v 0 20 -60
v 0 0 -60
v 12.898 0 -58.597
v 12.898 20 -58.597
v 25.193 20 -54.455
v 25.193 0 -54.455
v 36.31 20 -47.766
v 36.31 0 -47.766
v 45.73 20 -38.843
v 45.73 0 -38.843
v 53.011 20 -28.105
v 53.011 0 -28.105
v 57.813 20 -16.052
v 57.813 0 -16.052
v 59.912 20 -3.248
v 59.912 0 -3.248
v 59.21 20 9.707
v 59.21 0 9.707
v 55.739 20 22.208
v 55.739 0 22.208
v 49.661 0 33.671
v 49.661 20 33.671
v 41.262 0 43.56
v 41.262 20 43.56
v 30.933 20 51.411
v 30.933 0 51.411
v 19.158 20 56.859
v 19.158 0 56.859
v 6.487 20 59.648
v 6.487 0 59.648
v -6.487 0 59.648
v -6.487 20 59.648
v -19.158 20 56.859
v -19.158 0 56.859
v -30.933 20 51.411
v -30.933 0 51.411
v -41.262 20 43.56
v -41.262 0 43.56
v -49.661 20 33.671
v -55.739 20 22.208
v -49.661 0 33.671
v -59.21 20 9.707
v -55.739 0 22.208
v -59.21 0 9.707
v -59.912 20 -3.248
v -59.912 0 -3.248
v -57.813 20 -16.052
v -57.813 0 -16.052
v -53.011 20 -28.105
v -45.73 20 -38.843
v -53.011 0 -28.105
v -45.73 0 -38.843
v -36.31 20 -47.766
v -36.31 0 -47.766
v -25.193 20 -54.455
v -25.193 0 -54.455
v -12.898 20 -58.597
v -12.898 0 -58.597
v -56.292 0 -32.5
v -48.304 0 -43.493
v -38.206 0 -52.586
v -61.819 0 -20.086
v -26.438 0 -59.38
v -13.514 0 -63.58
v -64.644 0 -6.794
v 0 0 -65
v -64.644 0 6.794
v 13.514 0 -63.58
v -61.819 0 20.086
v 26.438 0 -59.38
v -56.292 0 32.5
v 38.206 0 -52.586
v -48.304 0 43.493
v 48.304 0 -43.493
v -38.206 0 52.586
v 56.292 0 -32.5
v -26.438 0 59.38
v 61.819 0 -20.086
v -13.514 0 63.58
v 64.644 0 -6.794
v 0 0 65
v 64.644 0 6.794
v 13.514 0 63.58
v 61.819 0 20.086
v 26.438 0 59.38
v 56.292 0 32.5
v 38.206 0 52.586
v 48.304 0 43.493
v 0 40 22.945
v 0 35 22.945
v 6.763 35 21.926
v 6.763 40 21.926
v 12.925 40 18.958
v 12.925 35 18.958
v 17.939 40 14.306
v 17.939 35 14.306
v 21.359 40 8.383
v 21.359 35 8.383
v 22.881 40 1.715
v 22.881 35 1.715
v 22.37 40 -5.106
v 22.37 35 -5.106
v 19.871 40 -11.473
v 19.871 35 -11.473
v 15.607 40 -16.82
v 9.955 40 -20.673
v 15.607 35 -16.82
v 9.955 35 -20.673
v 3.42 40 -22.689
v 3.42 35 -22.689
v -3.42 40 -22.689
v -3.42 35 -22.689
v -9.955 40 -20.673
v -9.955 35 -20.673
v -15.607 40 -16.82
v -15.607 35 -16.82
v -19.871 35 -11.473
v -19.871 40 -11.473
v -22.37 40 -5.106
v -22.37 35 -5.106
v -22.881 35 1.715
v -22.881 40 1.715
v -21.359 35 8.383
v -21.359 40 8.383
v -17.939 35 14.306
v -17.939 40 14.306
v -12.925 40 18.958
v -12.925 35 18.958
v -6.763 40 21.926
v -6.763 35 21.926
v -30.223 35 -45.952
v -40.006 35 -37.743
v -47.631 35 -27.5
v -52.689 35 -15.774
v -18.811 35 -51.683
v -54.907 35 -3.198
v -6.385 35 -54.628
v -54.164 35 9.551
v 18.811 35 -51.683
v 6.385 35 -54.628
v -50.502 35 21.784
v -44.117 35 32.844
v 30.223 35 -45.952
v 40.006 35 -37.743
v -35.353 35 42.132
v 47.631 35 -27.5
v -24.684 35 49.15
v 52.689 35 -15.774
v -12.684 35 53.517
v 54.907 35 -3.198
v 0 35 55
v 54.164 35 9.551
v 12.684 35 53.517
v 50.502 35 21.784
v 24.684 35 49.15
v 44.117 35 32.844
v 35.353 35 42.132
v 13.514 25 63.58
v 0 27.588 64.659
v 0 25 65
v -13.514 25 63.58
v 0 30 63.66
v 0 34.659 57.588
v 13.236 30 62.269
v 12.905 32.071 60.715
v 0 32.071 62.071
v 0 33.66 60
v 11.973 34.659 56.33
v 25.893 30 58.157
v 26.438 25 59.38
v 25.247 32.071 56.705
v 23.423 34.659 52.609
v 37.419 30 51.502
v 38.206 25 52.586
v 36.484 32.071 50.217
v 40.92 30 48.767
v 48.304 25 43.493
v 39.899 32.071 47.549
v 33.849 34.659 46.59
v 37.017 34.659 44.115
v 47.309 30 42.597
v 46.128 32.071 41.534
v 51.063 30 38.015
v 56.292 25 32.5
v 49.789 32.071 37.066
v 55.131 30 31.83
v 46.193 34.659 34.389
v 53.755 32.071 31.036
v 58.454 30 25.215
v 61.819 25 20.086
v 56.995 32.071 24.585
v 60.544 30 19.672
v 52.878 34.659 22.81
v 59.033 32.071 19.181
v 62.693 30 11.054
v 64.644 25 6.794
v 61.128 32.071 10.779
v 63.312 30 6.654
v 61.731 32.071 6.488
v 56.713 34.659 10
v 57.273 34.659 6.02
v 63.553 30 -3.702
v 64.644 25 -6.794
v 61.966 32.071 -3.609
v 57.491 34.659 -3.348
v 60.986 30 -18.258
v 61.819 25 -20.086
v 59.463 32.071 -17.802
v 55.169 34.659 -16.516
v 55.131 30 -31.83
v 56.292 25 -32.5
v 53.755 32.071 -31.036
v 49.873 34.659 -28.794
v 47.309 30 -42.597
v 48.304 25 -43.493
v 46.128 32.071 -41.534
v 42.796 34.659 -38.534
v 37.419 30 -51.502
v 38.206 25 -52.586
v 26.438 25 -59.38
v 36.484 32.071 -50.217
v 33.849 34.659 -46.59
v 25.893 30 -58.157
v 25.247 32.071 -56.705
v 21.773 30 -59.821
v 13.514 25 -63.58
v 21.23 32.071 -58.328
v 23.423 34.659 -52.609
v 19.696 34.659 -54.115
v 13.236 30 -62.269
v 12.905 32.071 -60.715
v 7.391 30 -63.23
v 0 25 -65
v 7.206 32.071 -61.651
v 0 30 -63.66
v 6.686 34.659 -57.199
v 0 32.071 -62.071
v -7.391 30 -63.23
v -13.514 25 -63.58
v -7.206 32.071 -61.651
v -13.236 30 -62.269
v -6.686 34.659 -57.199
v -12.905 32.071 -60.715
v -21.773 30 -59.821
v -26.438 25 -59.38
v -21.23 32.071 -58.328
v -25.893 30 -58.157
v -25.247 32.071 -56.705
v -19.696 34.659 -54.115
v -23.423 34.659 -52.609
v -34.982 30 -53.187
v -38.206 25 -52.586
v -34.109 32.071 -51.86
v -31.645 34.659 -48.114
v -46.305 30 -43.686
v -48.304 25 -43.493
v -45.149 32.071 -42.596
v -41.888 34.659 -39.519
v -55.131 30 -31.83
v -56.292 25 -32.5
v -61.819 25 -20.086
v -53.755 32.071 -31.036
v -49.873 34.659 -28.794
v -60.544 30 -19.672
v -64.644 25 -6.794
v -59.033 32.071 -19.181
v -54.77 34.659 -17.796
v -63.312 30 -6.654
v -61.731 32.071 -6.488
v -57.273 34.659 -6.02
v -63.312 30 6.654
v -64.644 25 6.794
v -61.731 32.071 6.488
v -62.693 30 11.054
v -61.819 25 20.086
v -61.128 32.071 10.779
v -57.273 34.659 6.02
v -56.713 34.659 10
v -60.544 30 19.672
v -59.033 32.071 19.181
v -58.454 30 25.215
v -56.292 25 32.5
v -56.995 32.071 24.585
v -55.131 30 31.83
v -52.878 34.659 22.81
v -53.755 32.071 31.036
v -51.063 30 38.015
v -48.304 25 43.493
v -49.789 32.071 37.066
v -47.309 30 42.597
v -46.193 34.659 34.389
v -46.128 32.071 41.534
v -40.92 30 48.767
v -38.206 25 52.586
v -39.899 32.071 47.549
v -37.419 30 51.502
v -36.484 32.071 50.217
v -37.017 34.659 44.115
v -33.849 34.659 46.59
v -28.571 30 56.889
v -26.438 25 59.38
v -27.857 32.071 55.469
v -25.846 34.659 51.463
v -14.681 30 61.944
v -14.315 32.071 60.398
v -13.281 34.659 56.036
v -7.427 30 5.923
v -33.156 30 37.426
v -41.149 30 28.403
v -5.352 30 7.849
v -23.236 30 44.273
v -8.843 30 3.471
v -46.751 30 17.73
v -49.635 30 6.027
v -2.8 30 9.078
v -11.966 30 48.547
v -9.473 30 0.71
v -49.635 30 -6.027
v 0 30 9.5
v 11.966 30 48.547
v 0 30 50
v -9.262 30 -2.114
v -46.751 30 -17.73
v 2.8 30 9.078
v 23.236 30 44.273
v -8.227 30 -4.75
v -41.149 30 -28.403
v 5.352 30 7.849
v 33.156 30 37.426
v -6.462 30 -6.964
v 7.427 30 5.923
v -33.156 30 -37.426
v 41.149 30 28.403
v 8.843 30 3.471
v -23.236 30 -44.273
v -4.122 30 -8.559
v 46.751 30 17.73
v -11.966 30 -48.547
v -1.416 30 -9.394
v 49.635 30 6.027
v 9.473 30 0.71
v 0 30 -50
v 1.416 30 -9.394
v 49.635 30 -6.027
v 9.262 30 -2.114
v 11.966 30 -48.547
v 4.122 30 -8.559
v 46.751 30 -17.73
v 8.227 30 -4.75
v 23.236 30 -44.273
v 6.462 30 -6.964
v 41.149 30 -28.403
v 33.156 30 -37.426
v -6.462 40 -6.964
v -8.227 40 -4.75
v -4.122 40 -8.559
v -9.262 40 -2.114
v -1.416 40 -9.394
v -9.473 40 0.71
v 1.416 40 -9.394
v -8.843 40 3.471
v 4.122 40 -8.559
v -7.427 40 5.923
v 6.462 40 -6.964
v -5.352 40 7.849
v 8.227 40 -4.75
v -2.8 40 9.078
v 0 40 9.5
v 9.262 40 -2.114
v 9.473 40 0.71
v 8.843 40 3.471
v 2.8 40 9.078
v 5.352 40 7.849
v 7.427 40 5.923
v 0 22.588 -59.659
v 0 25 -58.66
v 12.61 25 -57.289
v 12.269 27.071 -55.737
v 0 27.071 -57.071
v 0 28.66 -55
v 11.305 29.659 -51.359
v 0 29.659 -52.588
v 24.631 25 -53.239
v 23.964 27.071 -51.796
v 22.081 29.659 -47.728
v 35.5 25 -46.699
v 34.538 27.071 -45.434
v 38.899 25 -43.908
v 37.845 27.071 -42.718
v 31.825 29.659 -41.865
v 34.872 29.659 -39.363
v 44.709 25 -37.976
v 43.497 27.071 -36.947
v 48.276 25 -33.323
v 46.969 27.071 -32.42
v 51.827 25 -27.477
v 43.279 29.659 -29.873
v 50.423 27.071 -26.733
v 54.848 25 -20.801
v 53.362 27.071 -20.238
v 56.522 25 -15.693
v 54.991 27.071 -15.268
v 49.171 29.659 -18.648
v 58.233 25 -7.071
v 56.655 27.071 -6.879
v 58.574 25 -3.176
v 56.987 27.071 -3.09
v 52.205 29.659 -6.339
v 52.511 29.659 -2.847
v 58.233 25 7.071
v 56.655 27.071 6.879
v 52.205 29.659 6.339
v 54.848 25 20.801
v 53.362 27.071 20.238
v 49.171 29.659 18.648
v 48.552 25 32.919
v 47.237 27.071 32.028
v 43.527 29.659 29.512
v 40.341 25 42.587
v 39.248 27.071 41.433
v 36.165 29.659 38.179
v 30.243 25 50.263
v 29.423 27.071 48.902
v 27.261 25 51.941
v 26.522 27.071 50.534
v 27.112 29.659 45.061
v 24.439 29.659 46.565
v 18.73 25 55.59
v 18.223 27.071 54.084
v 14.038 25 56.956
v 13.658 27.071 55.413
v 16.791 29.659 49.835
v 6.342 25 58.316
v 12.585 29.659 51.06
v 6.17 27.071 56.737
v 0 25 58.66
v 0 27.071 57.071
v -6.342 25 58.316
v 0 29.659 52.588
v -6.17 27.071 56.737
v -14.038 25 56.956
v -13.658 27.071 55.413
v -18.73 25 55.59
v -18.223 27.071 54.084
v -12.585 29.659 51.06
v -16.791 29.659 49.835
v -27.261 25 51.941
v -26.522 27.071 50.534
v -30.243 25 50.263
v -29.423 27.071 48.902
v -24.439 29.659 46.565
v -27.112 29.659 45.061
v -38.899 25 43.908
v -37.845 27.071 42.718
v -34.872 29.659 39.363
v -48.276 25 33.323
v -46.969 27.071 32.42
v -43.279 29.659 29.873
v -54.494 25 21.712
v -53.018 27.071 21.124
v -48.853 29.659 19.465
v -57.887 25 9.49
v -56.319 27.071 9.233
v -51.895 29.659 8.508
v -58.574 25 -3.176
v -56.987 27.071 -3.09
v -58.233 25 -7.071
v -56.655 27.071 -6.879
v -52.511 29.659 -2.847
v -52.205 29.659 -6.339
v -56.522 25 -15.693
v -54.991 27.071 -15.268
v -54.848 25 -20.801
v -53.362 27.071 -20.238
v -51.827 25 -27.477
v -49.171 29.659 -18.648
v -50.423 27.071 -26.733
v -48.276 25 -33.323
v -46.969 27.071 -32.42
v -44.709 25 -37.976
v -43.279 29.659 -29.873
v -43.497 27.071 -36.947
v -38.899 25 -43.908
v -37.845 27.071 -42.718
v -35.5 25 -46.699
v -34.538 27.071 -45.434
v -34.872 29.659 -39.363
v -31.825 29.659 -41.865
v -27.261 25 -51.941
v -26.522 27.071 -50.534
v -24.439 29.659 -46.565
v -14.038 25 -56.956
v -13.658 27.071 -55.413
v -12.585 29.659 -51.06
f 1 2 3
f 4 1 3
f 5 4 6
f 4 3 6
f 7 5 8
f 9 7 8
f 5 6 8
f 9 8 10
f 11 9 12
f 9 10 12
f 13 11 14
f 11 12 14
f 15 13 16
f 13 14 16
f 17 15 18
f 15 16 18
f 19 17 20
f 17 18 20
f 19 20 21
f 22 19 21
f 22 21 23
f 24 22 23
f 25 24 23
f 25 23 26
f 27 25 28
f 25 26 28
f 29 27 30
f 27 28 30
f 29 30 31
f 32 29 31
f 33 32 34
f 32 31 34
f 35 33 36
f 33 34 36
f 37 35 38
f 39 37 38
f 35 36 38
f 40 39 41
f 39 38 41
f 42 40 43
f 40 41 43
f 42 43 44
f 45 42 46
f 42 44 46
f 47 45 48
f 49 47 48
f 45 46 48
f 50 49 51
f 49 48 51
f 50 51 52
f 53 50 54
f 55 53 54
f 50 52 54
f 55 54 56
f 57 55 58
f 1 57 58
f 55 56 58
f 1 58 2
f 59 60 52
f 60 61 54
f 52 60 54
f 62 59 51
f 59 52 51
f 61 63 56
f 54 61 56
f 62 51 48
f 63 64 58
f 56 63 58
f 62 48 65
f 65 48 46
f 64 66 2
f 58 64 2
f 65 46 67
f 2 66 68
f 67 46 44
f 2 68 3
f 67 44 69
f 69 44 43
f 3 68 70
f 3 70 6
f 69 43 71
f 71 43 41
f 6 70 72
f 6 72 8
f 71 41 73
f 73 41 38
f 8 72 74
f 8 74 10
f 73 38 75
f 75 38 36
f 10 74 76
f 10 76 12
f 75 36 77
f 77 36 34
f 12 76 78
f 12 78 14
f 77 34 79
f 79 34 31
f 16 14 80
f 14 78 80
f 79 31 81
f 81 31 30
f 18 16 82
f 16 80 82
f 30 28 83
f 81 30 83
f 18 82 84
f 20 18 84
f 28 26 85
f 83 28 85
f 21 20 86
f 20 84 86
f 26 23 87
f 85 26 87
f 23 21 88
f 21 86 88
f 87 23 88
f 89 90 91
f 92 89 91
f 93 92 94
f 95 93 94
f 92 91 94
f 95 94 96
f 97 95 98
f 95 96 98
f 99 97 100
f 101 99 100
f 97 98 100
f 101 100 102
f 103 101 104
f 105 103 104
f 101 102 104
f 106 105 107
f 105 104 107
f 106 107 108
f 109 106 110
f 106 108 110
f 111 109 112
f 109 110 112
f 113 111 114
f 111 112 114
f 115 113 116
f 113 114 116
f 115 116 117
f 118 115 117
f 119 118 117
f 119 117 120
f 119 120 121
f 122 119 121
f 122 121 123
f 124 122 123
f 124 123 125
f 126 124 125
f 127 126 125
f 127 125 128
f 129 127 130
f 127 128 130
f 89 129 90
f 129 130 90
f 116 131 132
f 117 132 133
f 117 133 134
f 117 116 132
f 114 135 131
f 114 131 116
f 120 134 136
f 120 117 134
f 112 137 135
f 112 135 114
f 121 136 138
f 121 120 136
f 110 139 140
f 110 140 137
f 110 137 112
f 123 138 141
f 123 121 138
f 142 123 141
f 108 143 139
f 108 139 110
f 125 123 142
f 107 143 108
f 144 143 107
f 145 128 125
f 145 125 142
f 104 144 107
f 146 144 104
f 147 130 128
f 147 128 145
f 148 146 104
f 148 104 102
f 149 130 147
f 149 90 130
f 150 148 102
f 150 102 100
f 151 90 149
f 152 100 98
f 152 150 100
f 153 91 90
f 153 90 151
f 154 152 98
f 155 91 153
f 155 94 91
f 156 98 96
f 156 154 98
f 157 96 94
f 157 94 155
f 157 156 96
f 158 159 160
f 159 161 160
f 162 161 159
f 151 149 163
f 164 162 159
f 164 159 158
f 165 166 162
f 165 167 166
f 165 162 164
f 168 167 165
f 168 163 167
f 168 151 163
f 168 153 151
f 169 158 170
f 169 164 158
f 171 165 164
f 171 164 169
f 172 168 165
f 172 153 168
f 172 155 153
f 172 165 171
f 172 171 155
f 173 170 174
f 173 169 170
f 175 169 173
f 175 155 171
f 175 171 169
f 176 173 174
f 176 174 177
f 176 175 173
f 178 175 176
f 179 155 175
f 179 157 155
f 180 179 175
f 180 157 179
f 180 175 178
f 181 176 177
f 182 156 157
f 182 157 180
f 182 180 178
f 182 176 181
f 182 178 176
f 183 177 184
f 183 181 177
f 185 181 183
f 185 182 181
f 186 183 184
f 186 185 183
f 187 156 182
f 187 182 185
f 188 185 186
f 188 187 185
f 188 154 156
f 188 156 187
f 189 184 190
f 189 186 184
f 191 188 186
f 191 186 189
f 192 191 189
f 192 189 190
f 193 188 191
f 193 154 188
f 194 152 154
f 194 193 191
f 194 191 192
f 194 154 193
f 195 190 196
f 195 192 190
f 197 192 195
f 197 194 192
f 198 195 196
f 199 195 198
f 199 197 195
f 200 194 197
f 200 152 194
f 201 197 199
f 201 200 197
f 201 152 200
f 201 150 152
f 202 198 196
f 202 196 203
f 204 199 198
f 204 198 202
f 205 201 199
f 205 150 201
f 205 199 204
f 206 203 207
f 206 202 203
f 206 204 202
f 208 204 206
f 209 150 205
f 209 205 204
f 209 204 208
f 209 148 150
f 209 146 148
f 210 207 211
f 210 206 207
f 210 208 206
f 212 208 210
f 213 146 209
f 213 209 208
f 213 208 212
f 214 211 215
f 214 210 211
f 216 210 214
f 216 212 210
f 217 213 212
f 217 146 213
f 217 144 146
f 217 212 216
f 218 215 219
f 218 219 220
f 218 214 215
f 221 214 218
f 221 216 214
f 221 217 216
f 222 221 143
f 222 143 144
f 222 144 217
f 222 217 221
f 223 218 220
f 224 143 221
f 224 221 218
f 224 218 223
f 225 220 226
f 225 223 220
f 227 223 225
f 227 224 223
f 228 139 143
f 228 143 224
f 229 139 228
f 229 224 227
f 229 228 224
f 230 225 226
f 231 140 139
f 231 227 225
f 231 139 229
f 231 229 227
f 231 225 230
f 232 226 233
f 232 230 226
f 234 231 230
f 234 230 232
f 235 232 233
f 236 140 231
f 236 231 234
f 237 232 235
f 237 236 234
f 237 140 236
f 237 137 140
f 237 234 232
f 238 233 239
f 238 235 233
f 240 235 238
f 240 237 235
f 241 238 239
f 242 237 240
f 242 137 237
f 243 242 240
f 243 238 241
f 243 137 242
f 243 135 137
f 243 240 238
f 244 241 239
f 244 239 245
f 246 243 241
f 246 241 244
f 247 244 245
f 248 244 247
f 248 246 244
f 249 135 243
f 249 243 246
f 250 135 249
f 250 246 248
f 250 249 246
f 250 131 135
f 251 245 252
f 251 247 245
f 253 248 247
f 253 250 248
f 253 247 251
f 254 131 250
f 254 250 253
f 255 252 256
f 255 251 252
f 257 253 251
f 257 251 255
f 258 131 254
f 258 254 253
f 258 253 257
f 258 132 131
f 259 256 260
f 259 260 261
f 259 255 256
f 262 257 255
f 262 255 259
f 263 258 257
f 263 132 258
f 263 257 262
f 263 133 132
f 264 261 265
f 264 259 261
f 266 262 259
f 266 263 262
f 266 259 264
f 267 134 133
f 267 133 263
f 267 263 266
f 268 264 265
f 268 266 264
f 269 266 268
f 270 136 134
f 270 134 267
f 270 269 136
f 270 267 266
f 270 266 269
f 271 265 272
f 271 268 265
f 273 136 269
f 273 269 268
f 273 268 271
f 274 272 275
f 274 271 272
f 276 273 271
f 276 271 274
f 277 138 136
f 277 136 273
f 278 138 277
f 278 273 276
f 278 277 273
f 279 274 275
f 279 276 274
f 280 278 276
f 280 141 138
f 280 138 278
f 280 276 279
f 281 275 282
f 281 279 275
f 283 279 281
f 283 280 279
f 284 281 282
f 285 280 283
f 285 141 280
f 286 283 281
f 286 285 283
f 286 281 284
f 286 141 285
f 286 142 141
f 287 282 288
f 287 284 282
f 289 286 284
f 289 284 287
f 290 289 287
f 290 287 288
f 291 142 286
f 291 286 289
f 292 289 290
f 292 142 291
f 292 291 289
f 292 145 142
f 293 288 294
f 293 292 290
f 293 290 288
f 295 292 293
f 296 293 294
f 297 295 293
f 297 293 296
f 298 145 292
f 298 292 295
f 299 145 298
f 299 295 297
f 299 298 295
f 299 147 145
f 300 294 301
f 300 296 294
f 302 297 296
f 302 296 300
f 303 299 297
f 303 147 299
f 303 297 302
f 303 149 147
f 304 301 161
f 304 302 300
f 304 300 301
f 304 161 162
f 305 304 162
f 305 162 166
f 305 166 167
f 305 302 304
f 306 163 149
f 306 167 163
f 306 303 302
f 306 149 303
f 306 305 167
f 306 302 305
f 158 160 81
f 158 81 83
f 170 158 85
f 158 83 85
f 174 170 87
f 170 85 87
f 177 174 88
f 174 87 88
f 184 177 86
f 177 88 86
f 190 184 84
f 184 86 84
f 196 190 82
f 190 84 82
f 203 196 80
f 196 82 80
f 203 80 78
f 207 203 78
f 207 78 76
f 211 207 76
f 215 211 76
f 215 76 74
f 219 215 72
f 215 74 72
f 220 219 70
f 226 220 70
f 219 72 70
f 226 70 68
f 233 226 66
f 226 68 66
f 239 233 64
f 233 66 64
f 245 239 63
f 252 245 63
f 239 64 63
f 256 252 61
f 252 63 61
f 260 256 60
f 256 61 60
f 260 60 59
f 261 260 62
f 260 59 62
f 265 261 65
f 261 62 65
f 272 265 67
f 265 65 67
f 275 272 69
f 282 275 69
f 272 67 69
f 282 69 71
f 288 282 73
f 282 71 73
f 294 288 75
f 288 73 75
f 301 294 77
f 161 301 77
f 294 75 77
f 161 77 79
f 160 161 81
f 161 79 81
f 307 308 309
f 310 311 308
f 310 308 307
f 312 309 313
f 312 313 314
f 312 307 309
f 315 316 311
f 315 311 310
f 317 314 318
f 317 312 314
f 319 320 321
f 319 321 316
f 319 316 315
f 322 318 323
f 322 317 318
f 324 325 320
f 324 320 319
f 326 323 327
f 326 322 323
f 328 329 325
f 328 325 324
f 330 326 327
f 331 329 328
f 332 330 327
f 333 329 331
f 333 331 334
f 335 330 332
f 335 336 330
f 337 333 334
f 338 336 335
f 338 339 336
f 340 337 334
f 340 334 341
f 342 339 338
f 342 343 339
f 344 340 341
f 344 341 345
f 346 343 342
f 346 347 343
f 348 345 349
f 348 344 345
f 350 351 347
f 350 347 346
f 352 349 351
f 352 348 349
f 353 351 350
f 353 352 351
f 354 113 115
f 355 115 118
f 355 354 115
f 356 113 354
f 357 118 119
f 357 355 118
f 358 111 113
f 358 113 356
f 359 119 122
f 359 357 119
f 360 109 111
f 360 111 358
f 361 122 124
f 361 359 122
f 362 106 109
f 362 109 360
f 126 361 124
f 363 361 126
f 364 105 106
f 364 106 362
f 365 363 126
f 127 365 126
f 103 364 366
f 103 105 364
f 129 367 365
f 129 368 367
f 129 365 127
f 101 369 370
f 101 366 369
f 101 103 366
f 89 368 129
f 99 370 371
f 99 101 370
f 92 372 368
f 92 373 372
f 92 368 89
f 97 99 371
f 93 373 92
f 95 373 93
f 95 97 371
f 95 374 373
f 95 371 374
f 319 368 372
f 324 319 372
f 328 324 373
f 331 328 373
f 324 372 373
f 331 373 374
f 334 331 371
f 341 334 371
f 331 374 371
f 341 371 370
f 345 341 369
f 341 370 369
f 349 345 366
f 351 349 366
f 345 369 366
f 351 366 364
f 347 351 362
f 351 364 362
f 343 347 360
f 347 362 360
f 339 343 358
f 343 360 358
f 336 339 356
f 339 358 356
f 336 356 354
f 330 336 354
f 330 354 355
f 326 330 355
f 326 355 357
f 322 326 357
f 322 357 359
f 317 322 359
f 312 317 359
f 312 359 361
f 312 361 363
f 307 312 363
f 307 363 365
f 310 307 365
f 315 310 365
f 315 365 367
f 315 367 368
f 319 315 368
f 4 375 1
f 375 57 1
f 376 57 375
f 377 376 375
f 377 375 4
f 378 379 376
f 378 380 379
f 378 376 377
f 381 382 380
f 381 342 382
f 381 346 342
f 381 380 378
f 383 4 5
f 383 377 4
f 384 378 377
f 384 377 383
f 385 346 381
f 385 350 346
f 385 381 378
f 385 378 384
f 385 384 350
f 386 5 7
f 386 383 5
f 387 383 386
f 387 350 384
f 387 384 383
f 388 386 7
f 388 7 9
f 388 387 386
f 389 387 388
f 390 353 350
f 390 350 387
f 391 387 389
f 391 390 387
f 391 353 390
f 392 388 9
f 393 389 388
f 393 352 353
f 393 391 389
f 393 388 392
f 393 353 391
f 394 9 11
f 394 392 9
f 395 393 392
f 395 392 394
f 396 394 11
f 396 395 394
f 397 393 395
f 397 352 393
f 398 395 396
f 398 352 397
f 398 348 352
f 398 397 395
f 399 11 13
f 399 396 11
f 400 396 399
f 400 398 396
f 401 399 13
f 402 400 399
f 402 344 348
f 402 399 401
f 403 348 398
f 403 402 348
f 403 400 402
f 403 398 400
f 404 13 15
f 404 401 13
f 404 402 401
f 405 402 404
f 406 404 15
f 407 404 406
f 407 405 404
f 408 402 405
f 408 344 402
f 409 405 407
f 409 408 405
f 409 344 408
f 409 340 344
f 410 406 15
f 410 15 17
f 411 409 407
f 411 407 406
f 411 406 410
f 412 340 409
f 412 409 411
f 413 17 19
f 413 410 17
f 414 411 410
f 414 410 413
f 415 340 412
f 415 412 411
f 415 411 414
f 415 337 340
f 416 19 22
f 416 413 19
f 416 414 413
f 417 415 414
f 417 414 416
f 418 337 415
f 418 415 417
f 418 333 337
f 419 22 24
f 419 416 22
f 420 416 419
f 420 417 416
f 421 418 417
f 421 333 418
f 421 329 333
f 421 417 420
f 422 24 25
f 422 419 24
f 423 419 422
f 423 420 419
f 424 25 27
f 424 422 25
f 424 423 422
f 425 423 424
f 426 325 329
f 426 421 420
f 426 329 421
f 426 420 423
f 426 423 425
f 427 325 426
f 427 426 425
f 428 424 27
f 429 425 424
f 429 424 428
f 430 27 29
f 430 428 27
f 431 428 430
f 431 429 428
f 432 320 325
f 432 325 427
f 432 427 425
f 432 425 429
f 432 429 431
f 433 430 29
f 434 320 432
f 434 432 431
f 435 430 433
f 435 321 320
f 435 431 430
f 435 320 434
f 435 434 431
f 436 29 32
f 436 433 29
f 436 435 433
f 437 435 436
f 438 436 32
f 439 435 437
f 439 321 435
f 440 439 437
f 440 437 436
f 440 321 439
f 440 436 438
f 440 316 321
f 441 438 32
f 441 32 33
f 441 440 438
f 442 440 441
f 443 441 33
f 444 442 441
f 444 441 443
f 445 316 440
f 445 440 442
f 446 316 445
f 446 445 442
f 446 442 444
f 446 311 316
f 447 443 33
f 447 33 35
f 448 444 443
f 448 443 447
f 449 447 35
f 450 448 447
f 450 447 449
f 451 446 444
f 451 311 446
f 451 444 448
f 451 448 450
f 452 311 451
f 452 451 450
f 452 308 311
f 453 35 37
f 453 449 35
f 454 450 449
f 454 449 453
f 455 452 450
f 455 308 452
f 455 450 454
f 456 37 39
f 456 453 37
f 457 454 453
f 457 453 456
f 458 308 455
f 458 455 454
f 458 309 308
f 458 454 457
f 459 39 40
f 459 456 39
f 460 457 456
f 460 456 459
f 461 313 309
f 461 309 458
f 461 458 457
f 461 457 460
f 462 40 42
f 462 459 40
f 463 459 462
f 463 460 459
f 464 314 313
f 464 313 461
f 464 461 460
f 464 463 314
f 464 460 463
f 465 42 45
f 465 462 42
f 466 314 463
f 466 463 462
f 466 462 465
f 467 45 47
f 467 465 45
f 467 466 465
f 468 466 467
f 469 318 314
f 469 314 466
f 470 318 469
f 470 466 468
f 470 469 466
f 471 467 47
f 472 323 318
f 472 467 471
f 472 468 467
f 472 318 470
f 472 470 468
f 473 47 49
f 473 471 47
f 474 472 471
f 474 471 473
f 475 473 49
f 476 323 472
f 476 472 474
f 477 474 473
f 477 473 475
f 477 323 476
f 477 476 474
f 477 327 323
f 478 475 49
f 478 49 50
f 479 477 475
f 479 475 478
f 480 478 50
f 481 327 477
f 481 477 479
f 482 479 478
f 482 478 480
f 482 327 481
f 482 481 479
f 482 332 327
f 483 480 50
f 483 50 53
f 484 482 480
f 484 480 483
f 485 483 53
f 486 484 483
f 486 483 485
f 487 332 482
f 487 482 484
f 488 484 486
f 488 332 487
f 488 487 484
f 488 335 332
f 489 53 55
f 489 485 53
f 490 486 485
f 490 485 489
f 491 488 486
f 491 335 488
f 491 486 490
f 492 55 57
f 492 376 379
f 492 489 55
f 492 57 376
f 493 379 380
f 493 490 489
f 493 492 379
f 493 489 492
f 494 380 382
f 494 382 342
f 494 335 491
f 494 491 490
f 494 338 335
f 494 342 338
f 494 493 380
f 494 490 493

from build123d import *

# Parameters (mm, degrees)
SKETCH1_R           = 65
BOSS_EXTRUDE1_DEPTH = 35
SKETCH2_R           = 22.945
BOSS_EXTRUDE2_DEPTH = 5
SKETCH3_R           = 9.5
CUT_EXTRUDE1_DEPTH  = 99
SKETCH4_R           = 60
CUT_EXTRUDE2_DEPTH  = 30
FILLET1_R           = 10
FILLET2_R           = 10


with BuildPart() as part:
    # Sketch1 → Boss-Extrude1 (new body)
    with BuildSketch(Plane(origin=(0, 0, 0), x_dir=(1, 0, 0), z_dir=(0, 1, 0))):
        with Locations(Location((0, 0, 0), (0, 0, 270))):
            Circle(SKETCH1_R)
    extrude(amount=BOSS_EXTRUDE1_DEPTH)

    # Sketch2 → Boss-Extrude2 (add)
    with BuildSketch(Plane(origin=(0, 35, 0), x_dir=(1, 0, 0), z_dir=(0, 1, 0))):
        with Locations(Location((0, 0, 0), (0, 0, 270))):
            Circle(SKETCH2_R)
    extrude(amount=BOSS_EXTRUDE2_DEPTH)

    # Sketch3 → Cut-Extrude1 (cut)
    with BuildSketch(Plane(origin=(0, 40, 0), x_dir=(1, 0, 0), z_dir=(0, 1, 0))):
        with Locations(Location((0, 0, 0), (0, 0, 270))):
            Circle(SKETCH3_R)
    extrude(amount=-CUT_EXTRUDE1_DEPTH, mode=Mode.SUBTRACT)

    # Sketch4 → Cut-Extrude2 (cut)
    with BuildSketch(Plane.XZ):
        with Locations(Location((0, 0, 0), (0, 0, 270))):
            Circle(SKETCH4_R)
    extrude(amount=-CUT_EXTRUDE2_DEPTH, mode=Mode.SUBTRACT)

    # Fillet1
    fillet1_edges = [part.edges().sort_by_distance(p)[0] for p in [
        (0, 35, -65),
    ]]
    fillet(fillet1_edges, radius=FILLET1_R)

    # Fillet2
    fillet2_edges = [part.edges().sort_by_distance(p)[0] for p in [
        (0, 30, 60),
    ]]
    fillet(fillet2_edges, radius=FILLET2_R)


solid = part.part
